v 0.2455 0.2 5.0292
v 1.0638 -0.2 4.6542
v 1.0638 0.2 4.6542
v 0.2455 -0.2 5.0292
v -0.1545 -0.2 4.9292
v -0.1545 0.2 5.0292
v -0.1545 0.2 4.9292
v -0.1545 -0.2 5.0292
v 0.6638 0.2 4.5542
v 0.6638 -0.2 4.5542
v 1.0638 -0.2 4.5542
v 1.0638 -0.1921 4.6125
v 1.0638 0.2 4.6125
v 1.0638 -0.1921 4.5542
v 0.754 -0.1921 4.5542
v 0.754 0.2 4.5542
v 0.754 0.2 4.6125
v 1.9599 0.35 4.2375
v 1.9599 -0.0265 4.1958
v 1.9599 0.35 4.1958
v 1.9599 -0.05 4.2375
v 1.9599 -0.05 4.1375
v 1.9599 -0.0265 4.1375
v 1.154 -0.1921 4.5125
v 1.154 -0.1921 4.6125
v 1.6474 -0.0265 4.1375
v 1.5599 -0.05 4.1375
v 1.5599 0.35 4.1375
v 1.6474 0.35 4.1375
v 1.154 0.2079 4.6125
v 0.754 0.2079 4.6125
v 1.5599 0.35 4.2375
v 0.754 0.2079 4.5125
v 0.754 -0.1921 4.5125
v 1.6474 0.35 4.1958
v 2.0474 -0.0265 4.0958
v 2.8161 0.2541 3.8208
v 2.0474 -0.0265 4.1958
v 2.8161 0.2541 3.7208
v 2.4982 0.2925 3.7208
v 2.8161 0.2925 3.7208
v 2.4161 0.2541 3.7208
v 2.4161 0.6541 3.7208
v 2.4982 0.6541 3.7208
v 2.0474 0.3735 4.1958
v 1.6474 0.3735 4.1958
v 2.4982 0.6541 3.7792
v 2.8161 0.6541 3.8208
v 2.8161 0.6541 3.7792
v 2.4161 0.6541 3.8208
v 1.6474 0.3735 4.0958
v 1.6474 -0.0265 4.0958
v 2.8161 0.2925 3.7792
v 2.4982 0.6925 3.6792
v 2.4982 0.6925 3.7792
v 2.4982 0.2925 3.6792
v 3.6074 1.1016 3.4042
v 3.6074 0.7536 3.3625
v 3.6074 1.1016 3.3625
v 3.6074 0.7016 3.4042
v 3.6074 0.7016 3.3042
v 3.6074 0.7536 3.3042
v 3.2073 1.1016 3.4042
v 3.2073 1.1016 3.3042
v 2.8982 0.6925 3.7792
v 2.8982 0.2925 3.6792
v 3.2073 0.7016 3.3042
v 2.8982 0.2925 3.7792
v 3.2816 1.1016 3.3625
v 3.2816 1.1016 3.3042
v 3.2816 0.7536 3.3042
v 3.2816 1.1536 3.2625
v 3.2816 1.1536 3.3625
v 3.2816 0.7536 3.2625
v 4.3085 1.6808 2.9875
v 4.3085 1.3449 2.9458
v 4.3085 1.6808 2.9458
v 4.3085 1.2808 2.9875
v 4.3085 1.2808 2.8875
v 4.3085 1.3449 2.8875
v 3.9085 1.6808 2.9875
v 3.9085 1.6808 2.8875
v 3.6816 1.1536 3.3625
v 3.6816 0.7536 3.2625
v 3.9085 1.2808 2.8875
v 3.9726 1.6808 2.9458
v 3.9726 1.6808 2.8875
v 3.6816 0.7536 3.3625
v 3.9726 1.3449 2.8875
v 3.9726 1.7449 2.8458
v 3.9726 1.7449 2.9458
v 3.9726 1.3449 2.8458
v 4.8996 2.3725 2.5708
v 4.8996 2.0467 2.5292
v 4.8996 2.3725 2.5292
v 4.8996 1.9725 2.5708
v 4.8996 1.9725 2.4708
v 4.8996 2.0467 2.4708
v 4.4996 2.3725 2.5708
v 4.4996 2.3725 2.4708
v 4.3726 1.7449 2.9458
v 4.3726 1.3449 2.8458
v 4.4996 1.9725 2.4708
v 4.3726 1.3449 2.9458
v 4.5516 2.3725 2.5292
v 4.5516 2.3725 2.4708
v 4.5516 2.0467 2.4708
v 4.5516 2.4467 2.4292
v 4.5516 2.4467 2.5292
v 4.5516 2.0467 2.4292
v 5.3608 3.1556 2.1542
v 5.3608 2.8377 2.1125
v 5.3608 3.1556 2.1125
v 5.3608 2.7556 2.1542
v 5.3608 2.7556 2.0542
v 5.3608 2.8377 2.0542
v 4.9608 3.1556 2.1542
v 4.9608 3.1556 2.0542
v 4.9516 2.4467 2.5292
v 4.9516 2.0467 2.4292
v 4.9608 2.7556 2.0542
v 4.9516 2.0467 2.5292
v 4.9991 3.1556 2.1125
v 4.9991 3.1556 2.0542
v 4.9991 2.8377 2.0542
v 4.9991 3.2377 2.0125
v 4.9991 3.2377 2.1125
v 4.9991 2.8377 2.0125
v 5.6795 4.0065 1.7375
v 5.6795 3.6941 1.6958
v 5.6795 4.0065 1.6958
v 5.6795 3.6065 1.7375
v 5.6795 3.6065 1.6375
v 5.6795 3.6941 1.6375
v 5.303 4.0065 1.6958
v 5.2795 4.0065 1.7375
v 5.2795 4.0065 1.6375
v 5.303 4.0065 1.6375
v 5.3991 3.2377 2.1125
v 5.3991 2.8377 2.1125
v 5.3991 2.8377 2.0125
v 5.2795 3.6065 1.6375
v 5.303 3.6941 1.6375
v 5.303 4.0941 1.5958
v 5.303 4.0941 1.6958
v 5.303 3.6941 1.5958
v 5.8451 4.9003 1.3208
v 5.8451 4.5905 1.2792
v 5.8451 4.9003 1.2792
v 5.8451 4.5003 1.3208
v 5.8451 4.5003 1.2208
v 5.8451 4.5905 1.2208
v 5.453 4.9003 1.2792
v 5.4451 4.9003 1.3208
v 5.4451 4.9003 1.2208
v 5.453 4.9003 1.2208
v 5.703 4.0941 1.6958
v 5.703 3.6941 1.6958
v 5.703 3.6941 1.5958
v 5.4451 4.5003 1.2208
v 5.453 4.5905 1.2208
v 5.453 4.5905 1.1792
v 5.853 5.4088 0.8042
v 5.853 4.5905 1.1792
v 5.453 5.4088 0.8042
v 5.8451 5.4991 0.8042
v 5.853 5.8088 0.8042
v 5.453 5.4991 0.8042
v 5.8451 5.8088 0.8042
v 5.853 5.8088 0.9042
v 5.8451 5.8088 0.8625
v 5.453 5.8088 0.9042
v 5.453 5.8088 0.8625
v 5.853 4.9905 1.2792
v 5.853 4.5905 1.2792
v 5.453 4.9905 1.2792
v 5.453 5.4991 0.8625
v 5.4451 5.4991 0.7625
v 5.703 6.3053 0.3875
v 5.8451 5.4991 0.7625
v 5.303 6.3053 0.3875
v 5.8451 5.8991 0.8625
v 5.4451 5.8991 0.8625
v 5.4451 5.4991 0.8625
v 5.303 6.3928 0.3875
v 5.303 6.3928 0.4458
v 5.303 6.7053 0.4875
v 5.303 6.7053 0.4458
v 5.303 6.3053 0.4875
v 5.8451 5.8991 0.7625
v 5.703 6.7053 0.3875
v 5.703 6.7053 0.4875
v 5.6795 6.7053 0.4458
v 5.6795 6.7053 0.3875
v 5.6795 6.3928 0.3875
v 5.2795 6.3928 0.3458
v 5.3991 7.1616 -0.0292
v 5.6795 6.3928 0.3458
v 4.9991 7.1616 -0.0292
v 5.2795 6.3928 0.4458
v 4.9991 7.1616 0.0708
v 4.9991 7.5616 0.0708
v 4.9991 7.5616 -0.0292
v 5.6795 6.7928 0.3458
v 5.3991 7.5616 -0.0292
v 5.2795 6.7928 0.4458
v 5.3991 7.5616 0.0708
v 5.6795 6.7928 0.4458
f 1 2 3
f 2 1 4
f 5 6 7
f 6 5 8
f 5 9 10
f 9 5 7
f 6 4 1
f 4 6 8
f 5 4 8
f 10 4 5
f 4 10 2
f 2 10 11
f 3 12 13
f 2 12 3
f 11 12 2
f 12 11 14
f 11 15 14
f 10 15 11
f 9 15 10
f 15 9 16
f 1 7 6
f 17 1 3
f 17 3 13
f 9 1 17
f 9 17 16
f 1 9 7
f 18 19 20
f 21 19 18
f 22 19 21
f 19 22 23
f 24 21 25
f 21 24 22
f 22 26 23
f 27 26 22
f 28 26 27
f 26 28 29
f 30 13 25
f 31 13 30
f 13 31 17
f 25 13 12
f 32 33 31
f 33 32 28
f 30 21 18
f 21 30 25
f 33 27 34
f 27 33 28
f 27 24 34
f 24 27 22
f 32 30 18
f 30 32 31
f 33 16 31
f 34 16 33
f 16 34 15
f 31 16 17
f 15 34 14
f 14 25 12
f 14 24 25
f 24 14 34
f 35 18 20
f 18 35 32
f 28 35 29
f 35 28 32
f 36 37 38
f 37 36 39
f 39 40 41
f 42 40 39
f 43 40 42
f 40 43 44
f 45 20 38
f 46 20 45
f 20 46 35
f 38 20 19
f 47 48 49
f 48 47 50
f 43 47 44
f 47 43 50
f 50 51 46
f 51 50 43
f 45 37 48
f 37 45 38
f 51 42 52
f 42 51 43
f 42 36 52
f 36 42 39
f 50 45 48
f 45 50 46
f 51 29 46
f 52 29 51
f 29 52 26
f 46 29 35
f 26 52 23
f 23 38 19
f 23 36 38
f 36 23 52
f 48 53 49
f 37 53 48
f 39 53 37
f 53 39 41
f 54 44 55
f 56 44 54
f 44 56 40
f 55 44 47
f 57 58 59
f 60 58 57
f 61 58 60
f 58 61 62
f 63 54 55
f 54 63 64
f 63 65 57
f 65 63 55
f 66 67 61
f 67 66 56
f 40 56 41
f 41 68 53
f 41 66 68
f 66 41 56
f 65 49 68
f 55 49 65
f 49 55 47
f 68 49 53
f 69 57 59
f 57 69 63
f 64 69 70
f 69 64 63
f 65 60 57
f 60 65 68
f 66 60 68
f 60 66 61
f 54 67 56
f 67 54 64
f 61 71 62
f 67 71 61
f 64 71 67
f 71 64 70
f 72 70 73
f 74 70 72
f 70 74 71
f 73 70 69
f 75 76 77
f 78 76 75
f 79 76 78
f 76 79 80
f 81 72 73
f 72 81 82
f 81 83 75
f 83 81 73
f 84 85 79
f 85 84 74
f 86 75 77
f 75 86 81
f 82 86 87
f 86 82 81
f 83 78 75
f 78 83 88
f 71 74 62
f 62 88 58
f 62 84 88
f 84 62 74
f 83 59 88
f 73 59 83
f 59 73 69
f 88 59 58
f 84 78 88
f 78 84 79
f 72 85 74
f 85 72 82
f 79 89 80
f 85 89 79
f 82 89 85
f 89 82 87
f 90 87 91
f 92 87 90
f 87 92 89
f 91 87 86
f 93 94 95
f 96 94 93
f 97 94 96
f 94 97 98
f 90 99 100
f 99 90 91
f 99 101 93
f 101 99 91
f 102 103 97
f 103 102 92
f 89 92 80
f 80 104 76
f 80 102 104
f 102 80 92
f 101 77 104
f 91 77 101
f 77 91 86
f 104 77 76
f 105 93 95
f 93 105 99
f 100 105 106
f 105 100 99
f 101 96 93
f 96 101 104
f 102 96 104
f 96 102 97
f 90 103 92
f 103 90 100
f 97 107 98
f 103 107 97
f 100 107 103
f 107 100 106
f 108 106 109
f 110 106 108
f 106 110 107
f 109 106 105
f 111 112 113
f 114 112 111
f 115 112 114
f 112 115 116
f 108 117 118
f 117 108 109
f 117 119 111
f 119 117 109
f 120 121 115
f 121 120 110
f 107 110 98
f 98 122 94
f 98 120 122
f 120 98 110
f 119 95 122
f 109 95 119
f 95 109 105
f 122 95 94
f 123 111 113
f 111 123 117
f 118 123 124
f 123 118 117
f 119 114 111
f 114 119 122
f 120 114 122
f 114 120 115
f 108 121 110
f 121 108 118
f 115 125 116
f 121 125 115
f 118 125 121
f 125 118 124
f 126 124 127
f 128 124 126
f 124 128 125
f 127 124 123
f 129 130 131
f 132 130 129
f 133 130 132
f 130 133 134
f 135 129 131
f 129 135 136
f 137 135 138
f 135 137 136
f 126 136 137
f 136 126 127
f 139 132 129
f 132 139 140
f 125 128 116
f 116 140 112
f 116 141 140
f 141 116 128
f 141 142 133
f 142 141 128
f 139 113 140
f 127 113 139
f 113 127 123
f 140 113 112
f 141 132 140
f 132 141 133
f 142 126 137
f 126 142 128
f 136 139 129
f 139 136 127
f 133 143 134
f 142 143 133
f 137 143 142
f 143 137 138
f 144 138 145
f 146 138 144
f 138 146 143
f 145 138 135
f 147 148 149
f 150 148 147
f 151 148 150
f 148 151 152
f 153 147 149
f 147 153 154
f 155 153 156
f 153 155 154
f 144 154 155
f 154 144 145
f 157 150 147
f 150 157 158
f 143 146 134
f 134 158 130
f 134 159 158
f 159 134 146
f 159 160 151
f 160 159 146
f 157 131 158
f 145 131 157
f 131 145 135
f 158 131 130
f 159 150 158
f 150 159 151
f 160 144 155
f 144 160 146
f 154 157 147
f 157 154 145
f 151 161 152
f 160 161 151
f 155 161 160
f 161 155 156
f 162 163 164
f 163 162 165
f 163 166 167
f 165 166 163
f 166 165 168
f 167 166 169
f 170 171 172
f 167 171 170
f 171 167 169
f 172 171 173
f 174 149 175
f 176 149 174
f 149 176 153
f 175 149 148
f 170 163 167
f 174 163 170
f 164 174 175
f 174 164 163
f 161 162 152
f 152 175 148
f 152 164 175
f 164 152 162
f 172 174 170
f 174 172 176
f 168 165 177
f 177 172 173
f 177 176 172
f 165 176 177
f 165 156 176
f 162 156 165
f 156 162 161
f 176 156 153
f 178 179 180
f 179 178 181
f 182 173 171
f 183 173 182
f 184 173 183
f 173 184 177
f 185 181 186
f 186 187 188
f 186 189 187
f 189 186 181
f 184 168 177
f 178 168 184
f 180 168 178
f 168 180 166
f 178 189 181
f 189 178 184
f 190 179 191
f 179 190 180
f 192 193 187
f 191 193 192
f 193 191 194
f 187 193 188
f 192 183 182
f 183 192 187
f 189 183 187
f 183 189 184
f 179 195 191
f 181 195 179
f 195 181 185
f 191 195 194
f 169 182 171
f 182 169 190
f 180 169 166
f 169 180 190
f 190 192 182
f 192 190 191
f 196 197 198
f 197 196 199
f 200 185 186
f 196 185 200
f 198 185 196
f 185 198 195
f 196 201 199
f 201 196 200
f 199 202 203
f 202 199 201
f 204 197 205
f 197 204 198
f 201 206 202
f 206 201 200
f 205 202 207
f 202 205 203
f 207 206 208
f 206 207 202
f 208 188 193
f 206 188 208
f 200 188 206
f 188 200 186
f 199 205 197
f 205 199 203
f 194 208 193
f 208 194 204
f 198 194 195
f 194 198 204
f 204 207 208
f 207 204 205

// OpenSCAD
hull() {
    translate([0.04546285, 0.0, 4.97916665]) cube([0.4, 0.4, 0.1], center=true);
    translate([0.8637941499999999, 0.0, 4.60416635]) cube([0.4, 0.4, 0.1], center=true);
}


hull() {
    translate([0.95402895, 0.007895000000000001, 4.5624997]) cube([0.4, 0.4, 0.1], center=true);
    translate([1.7599240500000002, 0.15000500000000003, 4.1875003]) cube([0.4, 0.4, 0.1], center=true);
}


hull() {
    translate([1.8474009500000002, 0.17349135000000002, 4.14583365]) cube([0.4, 0.4, 0.1], center=true);
    translate([2.61609005, 0.45413565, 3.77083335]) cube([0.4, 0.4, 0.1], center=true);
}


hull() {
    translate([2.69819265, 0.4924584, 3.72916665]) cube([0.4, 0.4, 0.1], center=true);
    translate([3.4073503499999998, 0.9016236000000001, 3.35416635]) cube([0.4, 0.4, 0.1], center=true);
}


hull() {
    translate([3.48157605, 0.95364015, 3.3124997]) cube([0.4, 0.4, 0.1], center=true);
    translate([4.108480950000001, 1.4807728500000001, 2.9375003]) cube([0.4, 0.4, 0.1], center=true);
}


hull() {
    translate([4.1725871, 1.54492205, 2.89583365]) cube([0.4, 0.4, 0.1], center=true);
    translate([4.699592900000001, 2.1724749500000002, 2.52083335]) cube([0.4, 0.4, 0.1], center=true);
}


hull() {
    translate([4.7516023, 2.2467224000000003, 2.47916665]) cube([0.4, 0.4, 0.1], center=true);
    translate([5.1607657, 2.9556236000000005, 2.10416635]) cube([0.4, 0.4, 0.1], center=true);
}


hull() {
    translate([5.1990774, 3.0377197500000004, 2.0624997]) cube([0.4, 0.4, 0.1], center=true);
    translate([5.4795245999999995, 3.80654925, 1.6875003]) cube([0.4, 0.4, 0.1], center=true);
}


hull() {
    translate([5.502999999999999, 3.8940515500000004, 1.64583365]) cube([0.4, 0.4, 0.1], center=true);
    translate([5.64511, 4.7002634500000005, 1.27083335]) cube([0.4, 0.4, 0.1], center=true);
}


hull() {
    translate([5.653005, 4.790515850000001, 1.22916665]) cube([0.4, 0.4, 0.1], center=true);
    translate([5.653005, 5.60884715, 0.8541663500000001]) cube([0.4, 0.4, 0.1], center=true);
}


hull() {
    translate([5.64511, 5.69909955, 0.8124997]) cube([0.4, 0.4, 0.1], center=true);
    translate([5.502999999999999, 6.50531145, 0.4375003]) cube([0.4, 0.4, 0.1], center=true);
}


hull() {
    translate([5.4795245999999995, 6.5928137499999995, 0.39583365000000004]) cube([0.4, 0.4, 0.1], center=true);
    translate([5.1990774, 7.36164325, 0.02083335]) cube([0.4, 0.4, 0.1], center=true);
}
